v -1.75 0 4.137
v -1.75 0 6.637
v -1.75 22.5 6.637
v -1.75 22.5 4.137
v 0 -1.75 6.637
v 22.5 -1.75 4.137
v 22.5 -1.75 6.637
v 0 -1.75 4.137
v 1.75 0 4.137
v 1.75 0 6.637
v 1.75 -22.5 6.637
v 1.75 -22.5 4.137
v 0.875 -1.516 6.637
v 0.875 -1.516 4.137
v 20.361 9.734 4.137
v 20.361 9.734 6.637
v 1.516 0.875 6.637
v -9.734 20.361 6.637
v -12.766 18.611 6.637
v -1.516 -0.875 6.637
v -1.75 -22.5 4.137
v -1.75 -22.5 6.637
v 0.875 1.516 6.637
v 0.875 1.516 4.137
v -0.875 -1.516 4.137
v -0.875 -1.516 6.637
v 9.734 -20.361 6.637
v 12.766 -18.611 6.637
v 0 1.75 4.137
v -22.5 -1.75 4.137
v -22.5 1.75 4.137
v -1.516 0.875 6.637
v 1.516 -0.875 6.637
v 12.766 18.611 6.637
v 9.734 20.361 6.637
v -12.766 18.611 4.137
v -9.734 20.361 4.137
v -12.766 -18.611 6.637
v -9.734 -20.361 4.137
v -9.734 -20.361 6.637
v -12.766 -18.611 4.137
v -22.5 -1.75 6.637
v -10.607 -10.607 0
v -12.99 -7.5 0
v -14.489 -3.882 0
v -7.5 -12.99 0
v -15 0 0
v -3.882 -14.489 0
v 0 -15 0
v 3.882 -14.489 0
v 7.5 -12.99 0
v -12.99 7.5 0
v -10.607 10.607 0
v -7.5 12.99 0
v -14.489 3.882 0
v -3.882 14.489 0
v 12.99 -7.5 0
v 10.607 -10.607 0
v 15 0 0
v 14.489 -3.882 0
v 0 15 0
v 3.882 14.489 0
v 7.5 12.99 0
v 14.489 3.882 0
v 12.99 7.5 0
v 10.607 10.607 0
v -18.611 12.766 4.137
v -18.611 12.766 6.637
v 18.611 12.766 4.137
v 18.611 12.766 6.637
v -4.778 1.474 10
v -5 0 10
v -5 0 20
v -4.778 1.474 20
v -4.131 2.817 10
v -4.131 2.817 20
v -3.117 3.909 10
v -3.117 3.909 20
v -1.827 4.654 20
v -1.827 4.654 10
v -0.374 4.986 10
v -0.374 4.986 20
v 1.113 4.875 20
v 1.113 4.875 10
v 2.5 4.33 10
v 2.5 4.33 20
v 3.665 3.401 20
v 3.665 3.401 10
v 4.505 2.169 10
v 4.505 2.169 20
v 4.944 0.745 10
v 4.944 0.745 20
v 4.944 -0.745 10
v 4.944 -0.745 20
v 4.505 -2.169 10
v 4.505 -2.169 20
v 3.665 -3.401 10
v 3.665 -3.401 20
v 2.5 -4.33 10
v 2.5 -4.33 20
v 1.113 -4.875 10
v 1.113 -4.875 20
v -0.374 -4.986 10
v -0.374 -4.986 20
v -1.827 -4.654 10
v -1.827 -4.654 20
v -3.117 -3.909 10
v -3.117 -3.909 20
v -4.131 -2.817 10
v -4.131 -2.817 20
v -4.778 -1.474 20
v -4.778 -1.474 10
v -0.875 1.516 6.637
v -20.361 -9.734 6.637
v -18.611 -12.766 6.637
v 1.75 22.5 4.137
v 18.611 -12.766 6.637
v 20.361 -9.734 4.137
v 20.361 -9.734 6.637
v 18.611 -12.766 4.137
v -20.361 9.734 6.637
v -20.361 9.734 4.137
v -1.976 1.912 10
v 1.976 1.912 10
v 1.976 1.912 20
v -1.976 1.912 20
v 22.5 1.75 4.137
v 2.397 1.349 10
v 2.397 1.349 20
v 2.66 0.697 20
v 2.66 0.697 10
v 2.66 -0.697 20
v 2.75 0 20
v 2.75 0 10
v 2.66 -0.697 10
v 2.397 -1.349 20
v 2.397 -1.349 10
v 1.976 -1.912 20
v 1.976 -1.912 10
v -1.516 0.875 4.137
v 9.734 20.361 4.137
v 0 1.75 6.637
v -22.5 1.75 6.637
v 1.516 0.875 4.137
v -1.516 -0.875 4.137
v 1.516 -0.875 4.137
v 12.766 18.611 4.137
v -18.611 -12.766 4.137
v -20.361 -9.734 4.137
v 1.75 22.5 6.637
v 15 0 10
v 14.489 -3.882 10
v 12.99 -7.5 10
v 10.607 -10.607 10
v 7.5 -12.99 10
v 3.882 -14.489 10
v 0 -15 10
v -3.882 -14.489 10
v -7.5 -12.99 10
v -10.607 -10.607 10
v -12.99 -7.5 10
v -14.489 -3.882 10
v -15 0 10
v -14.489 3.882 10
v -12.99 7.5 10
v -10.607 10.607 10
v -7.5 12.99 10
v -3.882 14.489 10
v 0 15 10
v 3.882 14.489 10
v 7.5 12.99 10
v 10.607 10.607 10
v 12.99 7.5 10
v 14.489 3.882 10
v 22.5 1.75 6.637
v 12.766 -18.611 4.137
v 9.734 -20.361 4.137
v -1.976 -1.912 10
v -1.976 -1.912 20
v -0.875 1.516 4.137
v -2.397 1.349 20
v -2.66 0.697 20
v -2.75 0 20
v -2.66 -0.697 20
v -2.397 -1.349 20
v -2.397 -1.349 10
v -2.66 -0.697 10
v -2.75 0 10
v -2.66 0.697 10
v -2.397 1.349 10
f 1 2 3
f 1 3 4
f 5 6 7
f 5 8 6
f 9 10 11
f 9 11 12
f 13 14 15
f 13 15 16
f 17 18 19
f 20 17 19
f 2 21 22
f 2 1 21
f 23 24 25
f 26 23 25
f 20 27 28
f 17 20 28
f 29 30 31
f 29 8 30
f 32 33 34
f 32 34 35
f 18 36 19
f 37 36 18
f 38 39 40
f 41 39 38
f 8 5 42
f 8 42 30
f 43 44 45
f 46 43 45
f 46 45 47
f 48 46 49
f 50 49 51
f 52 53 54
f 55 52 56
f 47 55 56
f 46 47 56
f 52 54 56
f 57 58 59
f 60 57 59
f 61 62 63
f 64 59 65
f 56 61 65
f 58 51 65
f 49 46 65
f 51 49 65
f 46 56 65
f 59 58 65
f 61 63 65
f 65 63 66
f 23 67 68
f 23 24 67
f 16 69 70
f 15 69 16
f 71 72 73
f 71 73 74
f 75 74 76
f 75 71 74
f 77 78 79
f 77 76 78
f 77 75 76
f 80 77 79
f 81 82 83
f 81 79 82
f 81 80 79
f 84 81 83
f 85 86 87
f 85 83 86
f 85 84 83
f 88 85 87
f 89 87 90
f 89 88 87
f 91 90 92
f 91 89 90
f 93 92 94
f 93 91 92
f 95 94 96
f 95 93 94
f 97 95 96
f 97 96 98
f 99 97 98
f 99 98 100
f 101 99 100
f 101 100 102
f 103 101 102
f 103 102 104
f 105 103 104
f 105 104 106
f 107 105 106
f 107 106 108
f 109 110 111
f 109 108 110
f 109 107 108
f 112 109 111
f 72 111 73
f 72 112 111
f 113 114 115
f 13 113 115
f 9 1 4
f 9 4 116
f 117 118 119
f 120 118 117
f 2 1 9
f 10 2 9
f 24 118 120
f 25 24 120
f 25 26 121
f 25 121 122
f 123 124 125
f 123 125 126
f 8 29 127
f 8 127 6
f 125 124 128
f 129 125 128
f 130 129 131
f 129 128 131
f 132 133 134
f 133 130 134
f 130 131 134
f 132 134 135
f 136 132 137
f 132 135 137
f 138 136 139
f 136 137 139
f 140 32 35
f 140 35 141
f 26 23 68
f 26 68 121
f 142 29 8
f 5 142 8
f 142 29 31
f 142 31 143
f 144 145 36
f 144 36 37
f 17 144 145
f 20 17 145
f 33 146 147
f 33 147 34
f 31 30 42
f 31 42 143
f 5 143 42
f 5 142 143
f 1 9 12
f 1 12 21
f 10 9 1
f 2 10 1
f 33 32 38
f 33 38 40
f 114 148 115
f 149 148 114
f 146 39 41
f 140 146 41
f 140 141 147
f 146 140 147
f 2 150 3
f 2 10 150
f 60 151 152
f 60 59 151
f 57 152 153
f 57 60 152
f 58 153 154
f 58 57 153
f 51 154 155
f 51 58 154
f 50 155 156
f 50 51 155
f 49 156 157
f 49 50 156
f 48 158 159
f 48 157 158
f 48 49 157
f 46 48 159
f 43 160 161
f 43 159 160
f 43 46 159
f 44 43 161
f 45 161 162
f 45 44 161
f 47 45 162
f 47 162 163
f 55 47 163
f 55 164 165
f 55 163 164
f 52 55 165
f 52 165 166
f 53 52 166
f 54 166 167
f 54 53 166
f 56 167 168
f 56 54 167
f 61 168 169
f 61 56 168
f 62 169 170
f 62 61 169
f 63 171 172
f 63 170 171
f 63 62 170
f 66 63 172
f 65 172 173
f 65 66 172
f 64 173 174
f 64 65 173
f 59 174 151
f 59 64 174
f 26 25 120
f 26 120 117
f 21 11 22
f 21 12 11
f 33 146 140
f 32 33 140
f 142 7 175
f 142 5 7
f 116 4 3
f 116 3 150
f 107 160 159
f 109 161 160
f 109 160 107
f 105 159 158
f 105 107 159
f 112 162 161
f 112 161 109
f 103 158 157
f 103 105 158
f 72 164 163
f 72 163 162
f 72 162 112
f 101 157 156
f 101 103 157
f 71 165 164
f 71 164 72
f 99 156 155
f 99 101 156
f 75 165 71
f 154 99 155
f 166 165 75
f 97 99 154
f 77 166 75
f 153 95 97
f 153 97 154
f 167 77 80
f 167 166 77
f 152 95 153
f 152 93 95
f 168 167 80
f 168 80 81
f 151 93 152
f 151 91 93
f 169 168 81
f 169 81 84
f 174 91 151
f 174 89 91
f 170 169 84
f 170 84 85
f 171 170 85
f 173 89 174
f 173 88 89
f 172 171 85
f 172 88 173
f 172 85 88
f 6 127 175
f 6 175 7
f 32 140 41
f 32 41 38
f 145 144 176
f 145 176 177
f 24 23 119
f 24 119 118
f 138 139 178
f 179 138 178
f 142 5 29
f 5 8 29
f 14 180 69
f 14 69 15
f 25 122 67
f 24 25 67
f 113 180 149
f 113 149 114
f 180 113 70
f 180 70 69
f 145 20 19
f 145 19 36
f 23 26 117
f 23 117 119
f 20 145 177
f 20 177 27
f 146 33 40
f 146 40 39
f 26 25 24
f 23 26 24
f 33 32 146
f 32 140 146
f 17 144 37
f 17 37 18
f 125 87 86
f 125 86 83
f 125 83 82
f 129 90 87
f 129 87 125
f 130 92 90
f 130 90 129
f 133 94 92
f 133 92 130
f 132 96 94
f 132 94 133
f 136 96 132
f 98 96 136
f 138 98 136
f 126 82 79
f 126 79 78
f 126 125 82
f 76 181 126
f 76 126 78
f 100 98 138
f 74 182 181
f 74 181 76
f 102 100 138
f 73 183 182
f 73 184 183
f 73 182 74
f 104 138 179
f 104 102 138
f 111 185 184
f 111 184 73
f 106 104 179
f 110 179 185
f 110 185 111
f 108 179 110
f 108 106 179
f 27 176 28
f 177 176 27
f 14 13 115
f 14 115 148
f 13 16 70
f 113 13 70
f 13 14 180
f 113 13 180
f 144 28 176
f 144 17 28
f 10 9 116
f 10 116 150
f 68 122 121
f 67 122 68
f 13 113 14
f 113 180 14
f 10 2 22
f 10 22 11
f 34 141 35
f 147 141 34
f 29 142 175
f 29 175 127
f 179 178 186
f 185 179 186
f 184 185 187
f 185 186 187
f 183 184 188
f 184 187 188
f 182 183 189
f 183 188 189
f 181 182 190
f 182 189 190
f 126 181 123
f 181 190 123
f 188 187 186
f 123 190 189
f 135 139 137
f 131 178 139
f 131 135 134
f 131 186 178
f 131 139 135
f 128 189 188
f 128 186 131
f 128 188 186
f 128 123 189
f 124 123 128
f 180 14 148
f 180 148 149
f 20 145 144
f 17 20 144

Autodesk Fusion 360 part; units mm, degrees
sketch "Sketch1" plane through (0, 0, 0) normal (0, 0, 1) x (1, 0, 0)
  circle A0 centre (0, 0) radius 15
  dimension "d1" = 30
extrude "Extrude1" add sketch "Sketch1" along normal blind 10 makes body 1
sketch "Sketch2" plane through (0, 0, 0) normal (0, 1, 0) x (1, 0, 0)
  line L0 (-1.75, -4.1374) -> (1.75, -4.1374)
  line L1 (1.75, -4.1374) -> (1.75, -6.6374)
  line L2 (1.75, -6.6374) -> (-1.75, -6.6374)
  line L3 (-1.75, -6.6374) -> (-1.75, -4.1374)
  line L4 (-1.75, -4.1374) -> (1.75, -6.6374) construction
  line L5 (1.75, -4.1374) -> (-1.75, -6.6374) construction
  point P0 (0, -5.3874)
  dimension "d4" = 2.5
  dimension "d5" = 3.5
extrude "Extrude3" add sketch "Sketch2" along normal blind 36 separate body makes body 2
extrude "Extrude4" cut 1 faces at (0.5833, 36, 4.9708) along direction (0, -1, 0) blind 18 on bodies 2 bodies 2
extrude "Extrude5" cut 1 faces at (0.5833, 18, 4.9708) along direction (0, -1, 0) blind 1 on bodies 2 bodies 2
sketch "Sketch6" plane through (-1.75, 0, 0) normal (-1, 0, 0) x (0, -1, 0)
  line L0 (-17, 6.6374) -> (-17, 4.1374)
  line L1 (-17, 4.1374) -> (0, 4.1374)
  line L2 (0, 4.1374) -> (0, 6.6374)
  line L3 (0, 6.6374) -> (-17, 6.6374)
  line L4 (-17, 6.6374) -> (-15, 6.6374)
extrude "Extrude6" add 1 faces at (0.5833, 17, 4.9708) along direction (0, 1, 0) blind 0.5 on bodies 2 bodies 2
extrude "Extrude22" add 1 faces at (0.5833, 17.5, 4.9708) along direction (0, 1, 0) blind 5 on bodies 2 bodies 2
pattern_circular "C-Pattern1" count 12 over 360 about axis through (0, 0, 0) along (0, 0, 1) of bodies 2 makes body 3 at (-6.9948, 13.282, 4.1374) makes body 4 at (-6.7869, 3.2448, 4.1374) makes body 5 at (-7.5, 0.5833, 6.6374) makes body 6 at (-13.282, -6.9948, 4.1374) makes body 7 at (-8.0052, -12.6987, 4.1374) makes body 8 at (0.5833, -7.5, 4.1374) makes body 9 at (8.0052, -12.6987, 6.6374) makes body 10 at (6.2035, -4.2552, 6.6374) makes body 11 at (7.5, -0.5833, 6.6374) makes body 12 at (13.282, 6.9948, 4.1374) makes body 13 at (3.2448, 6.7869, 4.1374)
sketch "Sketch9" plane through (0, 0, 10) normal (0, 0, 1) x (-1, 0, 0)
  circle A0 centre (0, 0) radius 15
  circle A1 centre (0, 0) radius 2.75
  line L0 (-1.9765, 1.9121) -> (1.9765, 1.9121)
  line L1 (-1.9765, -1.9121) -> (1.9765, -1.9121)
  circle A2 centre (0, 0) radius 5
  dimension "d61" = 5.5
extrude "Extrude23" add sketch "Sketch9" along normal blind 10 contours A1 L0 | A1 L1 | A2 bodies 1
extrude "Extrude21" [suppressed]
